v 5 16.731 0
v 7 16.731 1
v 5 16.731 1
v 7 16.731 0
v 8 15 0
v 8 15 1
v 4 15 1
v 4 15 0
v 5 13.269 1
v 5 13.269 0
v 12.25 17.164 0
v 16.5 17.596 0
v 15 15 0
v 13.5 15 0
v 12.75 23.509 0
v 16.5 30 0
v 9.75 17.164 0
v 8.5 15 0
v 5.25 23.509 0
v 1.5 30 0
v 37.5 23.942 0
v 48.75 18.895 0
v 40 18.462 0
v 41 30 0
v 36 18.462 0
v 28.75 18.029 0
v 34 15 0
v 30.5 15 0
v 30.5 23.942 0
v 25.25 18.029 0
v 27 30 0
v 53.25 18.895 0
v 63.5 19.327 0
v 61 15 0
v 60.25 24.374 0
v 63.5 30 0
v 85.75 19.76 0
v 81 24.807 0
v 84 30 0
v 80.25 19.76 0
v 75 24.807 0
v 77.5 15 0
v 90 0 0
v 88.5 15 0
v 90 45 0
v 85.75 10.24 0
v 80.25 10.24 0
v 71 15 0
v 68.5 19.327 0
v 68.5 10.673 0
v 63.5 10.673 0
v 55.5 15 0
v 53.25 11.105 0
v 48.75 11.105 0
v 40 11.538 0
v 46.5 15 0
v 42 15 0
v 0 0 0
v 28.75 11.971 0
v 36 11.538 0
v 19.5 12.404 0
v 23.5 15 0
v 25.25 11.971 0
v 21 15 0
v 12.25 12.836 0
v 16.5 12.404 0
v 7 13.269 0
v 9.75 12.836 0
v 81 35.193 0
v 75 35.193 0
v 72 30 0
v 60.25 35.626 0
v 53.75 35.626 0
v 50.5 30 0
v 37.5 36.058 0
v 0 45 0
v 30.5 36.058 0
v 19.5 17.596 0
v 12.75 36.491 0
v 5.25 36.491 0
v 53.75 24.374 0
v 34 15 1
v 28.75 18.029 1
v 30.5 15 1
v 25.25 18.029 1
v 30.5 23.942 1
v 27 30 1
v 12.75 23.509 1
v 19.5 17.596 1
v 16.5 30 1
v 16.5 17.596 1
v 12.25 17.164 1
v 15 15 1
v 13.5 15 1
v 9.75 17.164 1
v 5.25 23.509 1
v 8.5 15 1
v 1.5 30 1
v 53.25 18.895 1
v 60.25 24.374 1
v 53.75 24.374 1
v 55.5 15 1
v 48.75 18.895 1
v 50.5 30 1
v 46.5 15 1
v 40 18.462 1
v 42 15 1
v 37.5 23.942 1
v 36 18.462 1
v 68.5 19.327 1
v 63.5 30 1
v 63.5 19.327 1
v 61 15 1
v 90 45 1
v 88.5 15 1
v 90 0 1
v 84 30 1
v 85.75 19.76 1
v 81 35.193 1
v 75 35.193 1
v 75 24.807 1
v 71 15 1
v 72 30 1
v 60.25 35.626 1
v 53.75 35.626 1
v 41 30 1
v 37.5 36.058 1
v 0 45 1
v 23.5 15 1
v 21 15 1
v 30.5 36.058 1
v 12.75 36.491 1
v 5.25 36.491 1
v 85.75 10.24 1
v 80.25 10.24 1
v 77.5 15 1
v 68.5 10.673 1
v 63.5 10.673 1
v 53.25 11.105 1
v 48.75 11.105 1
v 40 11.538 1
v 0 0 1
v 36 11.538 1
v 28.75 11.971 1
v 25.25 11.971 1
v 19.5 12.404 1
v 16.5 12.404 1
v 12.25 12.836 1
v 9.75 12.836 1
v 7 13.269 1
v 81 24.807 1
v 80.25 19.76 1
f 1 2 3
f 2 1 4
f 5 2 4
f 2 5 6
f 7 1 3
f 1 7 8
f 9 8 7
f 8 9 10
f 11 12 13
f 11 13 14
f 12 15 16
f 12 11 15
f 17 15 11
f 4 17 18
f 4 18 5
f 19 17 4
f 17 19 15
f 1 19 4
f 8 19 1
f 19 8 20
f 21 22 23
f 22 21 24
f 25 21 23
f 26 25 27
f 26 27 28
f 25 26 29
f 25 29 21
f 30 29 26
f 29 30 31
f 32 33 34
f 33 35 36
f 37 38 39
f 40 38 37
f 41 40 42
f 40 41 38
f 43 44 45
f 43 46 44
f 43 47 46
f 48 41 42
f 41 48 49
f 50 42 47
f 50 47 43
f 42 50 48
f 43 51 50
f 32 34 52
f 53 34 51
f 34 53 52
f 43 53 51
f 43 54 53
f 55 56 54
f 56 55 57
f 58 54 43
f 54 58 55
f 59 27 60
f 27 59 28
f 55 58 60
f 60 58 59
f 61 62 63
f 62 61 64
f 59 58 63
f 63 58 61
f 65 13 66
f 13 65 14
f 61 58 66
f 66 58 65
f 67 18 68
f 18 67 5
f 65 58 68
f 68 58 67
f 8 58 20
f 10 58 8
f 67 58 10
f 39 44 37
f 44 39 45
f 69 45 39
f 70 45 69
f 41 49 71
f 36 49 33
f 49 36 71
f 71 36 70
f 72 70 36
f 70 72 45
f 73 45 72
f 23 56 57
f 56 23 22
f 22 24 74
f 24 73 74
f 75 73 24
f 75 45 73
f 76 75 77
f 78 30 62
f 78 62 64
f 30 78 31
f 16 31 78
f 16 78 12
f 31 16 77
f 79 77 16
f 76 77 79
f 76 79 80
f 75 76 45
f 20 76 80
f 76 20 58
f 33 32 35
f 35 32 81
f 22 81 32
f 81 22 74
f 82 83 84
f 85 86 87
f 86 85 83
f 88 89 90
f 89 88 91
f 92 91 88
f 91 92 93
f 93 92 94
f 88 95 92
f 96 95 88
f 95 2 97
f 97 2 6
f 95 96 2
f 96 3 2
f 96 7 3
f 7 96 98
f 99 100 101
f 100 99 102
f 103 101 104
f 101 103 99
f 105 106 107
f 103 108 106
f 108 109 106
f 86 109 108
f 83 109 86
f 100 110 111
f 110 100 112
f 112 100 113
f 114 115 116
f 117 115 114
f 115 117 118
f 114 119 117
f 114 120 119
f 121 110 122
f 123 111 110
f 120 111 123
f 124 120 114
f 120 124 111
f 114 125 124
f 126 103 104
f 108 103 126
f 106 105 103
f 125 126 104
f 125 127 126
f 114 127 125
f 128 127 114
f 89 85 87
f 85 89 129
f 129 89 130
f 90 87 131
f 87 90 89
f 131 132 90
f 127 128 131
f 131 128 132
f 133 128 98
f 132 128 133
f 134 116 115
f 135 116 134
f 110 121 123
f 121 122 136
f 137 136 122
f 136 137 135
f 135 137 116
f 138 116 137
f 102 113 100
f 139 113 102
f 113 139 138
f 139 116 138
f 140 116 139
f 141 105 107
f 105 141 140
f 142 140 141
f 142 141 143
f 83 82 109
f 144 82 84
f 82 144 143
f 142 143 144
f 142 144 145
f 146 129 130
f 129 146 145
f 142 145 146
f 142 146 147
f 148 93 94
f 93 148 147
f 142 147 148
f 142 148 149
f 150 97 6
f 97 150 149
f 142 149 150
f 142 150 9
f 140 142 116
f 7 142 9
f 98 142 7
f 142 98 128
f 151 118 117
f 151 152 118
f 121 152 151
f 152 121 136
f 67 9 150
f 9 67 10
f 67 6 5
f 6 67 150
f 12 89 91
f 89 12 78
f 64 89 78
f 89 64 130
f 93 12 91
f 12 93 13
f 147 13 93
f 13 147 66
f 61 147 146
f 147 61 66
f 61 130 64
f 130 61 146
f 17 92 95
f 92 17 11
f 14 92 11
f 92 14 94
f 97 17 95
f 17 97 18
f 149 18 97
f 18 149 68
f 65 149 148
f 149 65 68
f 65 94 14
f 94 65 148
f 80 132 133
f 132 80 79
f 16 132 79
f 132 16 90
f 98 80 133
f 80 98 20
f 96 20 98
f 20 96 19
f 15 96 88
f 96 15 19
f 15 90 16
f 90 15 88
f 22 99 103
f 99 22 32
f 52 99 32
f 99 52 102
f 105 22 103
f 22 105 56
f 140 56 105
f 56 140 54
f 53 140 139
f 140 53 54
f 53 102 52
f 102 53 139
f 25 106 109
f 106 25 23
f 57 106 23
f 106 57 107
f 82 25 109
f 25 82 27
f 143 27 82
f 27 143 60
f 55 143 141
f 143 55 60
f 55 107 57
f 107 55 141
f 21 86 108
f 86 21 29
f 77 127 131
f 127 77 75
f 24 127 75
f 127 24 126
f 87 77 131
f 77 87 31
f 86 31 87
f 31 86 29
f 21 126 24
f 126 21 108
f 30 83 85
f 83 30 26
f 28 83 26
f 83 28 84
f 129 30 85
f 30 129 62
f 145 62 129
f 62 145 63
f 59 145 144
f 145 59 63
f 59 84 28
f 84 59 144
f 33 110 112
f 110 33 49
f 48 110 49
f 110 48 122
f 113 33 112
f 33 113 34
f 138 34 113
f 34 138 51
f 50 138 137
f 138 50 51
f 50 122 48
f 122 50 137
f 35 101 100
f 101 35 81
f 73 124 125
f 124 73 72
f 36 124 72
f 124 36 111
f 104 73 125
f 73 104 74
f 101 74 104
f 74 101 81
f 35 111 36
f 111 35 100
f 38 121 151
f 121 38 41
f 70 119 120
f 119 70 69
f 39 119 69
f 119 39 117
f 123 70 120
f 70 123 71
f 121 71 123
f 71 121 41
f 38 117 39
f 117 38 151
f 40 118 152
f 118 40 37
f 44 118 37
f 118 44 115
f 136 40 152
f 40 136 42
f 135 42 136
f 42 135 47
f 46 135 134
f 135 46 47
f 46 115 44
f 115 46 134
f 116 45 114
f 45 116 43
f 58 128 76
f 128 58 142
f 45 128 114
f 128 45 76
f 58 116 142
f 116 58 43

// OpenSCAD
difference() {
  translate([45.0000000000, 22.5000000000, 0.5000000000]) {
    scale([90.0000000000, 45.0000000000, 1.0000000000]) {
      translate([-0.5000000000, -0.5000000000, -0.5000000000]) {
        cube([1, 1, 1]);
      }
    }
  }
  union() {
    union() {
      union() {
        union() {
          union() {
            union() {
              union() {
                union() {
                  union() {
                    union() {
                      union() {
                        translate([6.0000000000, 15.0000000000, 0.5000000000]) {
                          scale([4.0000000000, 3.4640000000, 1.0000000000]) {
                            rotate([0.0000000000, 0.0000000000, -0.0000000000]) {
                              scale([0.5, 0.577, 1]) cylinder($fn = 6, center = true);
                            }
                          }
                        }
                        translate([18.0000000000, 15.0000000000, 0.5000000000]) {
                          scale([6.0000000000, 5.1960000000, 1.0000000000]) {
                            rotate([0.0000000000, 0.0000000000, -0.0000000000]) {
                              scale([0.5, 0.577, 1]) cylinder($fn = 6, center = true);
                            }
                          }
                        }
                      }
                      translate([11.0000000000, 15.0000000000, 0.5000000000]) {
                        scale([5.0000000000, 4.3300000000, 1.0000000000]) {
                          rotate([0.0000000000, 0.0000000000, -0.0000000000]) {
                            scale([0.5, 0.577, 1]) cylinder($fn = 6, center = true);
                          }
                        }
                      }
                    }
                    translate([9.0000000000, 30.0000000000, 0.5000000000]) {
                      scale([15.0000000000, 12.9900000000, 1.0000000000]) {
                        rotate([0.0000000000, 0.0000000000, -0.0000000000]) {
                          scale([0.5, 0.577, 1]) cylinder($fn = 6, center = true);
                        }
                      }
                    }
                  }
                  translate([51.0000000000, 15.0000000000, 0.5000000000]) {
                    scale([9.0000000000, 7.7940000000, 1.0000000000]) {
                      rotate([0.0000000000, 0.0000000000, -0.0000000000]) {
                        scale([0.5, 0.577, 1]) cylinder($fn = 6, center = true);
                      }
                    }
                  }
                }
                translate([38.0000000000, 15.0000000000, 0.5000000000]) {
                  scale([8.0000000000, 6.9280000000, 1.0000000000]) {
                    rotate([0.0000000000, 0.0000000000, -0.0000000000]) {
                      scale([0.5, 0.577, 1]) cylinder($fn = 6, center = true);
                    }
                  }
                }
              }
              translate([34.0000000000, 30.0000000000, 0.5000000000]) {
                scale([14.0000000000, 12.1240000000, 1.0000000000]) {
                  rotate([0.0000000000, 0.0000000000, -0.0000000000]) {
                    scale([0.5, 0.577, 1]) cylinder($fn = 6, center = true);
                  }
                }
              }
            }
            translate([27.0000000000, 15.0000000000, 0.5000000000]) {
              scale([7.0000000000, 6.0620000000, 1.0000000000]) {
                rotate([0.0000000000, 0.0000000000, -0.0000000000]) {
                  scale([0.5, 0.577, 1]) cylinder($fn = 6, center = true);
                }
              }
            }
          }
          translate([66.0000000000, 15.0000000000, 0.5000000000]) {
            scale([10.0000000000, 8.6600000000, 1.0000000000]) {
              rotate([0.0000000000, 0.0000000000, -0.0000000000]) {
                scale([0.5, 0.577, 1]) cylinder($fn = 6, center = true);
              }
            }
          }
        }
        translate([57.0000000000, 30.0000000000, 0.5000000000]) {
          scale([13.0000000000, 11.2580000000, 1.0000000000]) {
            rotate([0.0000000000, 0.0000000000, -0.0000000000]) {
              scale([0.5, 0.577, 1]) cylinder($fn = 6, center = true);
            }
          }
        }
      }
      translate([78.0000000000, 30.0000000000, 0.5000000000]) {
        scale([12.0000000000, 10.3920000000, 1.0000000000]) {
          rotate([0.0000000000, 0.0000000000, -0.0000000000]) {
            scale([0.5, 0.577, 1]) cylinder($fn = 6, center = true);
          }
        }
      }
    }
    translate([83.0000000000, 15.0000000000, 0.5000000000]) {
      scale([11.0000000000, 9.5260000000, 1.0000000000]) {
        rotate([0.0000000000, 0.0000000000, -0.0000000000]) {
          scale([0.5, 0.577, 1]) cylinder($fn = 6, center = true);
        }
      }
    }
  }
}
